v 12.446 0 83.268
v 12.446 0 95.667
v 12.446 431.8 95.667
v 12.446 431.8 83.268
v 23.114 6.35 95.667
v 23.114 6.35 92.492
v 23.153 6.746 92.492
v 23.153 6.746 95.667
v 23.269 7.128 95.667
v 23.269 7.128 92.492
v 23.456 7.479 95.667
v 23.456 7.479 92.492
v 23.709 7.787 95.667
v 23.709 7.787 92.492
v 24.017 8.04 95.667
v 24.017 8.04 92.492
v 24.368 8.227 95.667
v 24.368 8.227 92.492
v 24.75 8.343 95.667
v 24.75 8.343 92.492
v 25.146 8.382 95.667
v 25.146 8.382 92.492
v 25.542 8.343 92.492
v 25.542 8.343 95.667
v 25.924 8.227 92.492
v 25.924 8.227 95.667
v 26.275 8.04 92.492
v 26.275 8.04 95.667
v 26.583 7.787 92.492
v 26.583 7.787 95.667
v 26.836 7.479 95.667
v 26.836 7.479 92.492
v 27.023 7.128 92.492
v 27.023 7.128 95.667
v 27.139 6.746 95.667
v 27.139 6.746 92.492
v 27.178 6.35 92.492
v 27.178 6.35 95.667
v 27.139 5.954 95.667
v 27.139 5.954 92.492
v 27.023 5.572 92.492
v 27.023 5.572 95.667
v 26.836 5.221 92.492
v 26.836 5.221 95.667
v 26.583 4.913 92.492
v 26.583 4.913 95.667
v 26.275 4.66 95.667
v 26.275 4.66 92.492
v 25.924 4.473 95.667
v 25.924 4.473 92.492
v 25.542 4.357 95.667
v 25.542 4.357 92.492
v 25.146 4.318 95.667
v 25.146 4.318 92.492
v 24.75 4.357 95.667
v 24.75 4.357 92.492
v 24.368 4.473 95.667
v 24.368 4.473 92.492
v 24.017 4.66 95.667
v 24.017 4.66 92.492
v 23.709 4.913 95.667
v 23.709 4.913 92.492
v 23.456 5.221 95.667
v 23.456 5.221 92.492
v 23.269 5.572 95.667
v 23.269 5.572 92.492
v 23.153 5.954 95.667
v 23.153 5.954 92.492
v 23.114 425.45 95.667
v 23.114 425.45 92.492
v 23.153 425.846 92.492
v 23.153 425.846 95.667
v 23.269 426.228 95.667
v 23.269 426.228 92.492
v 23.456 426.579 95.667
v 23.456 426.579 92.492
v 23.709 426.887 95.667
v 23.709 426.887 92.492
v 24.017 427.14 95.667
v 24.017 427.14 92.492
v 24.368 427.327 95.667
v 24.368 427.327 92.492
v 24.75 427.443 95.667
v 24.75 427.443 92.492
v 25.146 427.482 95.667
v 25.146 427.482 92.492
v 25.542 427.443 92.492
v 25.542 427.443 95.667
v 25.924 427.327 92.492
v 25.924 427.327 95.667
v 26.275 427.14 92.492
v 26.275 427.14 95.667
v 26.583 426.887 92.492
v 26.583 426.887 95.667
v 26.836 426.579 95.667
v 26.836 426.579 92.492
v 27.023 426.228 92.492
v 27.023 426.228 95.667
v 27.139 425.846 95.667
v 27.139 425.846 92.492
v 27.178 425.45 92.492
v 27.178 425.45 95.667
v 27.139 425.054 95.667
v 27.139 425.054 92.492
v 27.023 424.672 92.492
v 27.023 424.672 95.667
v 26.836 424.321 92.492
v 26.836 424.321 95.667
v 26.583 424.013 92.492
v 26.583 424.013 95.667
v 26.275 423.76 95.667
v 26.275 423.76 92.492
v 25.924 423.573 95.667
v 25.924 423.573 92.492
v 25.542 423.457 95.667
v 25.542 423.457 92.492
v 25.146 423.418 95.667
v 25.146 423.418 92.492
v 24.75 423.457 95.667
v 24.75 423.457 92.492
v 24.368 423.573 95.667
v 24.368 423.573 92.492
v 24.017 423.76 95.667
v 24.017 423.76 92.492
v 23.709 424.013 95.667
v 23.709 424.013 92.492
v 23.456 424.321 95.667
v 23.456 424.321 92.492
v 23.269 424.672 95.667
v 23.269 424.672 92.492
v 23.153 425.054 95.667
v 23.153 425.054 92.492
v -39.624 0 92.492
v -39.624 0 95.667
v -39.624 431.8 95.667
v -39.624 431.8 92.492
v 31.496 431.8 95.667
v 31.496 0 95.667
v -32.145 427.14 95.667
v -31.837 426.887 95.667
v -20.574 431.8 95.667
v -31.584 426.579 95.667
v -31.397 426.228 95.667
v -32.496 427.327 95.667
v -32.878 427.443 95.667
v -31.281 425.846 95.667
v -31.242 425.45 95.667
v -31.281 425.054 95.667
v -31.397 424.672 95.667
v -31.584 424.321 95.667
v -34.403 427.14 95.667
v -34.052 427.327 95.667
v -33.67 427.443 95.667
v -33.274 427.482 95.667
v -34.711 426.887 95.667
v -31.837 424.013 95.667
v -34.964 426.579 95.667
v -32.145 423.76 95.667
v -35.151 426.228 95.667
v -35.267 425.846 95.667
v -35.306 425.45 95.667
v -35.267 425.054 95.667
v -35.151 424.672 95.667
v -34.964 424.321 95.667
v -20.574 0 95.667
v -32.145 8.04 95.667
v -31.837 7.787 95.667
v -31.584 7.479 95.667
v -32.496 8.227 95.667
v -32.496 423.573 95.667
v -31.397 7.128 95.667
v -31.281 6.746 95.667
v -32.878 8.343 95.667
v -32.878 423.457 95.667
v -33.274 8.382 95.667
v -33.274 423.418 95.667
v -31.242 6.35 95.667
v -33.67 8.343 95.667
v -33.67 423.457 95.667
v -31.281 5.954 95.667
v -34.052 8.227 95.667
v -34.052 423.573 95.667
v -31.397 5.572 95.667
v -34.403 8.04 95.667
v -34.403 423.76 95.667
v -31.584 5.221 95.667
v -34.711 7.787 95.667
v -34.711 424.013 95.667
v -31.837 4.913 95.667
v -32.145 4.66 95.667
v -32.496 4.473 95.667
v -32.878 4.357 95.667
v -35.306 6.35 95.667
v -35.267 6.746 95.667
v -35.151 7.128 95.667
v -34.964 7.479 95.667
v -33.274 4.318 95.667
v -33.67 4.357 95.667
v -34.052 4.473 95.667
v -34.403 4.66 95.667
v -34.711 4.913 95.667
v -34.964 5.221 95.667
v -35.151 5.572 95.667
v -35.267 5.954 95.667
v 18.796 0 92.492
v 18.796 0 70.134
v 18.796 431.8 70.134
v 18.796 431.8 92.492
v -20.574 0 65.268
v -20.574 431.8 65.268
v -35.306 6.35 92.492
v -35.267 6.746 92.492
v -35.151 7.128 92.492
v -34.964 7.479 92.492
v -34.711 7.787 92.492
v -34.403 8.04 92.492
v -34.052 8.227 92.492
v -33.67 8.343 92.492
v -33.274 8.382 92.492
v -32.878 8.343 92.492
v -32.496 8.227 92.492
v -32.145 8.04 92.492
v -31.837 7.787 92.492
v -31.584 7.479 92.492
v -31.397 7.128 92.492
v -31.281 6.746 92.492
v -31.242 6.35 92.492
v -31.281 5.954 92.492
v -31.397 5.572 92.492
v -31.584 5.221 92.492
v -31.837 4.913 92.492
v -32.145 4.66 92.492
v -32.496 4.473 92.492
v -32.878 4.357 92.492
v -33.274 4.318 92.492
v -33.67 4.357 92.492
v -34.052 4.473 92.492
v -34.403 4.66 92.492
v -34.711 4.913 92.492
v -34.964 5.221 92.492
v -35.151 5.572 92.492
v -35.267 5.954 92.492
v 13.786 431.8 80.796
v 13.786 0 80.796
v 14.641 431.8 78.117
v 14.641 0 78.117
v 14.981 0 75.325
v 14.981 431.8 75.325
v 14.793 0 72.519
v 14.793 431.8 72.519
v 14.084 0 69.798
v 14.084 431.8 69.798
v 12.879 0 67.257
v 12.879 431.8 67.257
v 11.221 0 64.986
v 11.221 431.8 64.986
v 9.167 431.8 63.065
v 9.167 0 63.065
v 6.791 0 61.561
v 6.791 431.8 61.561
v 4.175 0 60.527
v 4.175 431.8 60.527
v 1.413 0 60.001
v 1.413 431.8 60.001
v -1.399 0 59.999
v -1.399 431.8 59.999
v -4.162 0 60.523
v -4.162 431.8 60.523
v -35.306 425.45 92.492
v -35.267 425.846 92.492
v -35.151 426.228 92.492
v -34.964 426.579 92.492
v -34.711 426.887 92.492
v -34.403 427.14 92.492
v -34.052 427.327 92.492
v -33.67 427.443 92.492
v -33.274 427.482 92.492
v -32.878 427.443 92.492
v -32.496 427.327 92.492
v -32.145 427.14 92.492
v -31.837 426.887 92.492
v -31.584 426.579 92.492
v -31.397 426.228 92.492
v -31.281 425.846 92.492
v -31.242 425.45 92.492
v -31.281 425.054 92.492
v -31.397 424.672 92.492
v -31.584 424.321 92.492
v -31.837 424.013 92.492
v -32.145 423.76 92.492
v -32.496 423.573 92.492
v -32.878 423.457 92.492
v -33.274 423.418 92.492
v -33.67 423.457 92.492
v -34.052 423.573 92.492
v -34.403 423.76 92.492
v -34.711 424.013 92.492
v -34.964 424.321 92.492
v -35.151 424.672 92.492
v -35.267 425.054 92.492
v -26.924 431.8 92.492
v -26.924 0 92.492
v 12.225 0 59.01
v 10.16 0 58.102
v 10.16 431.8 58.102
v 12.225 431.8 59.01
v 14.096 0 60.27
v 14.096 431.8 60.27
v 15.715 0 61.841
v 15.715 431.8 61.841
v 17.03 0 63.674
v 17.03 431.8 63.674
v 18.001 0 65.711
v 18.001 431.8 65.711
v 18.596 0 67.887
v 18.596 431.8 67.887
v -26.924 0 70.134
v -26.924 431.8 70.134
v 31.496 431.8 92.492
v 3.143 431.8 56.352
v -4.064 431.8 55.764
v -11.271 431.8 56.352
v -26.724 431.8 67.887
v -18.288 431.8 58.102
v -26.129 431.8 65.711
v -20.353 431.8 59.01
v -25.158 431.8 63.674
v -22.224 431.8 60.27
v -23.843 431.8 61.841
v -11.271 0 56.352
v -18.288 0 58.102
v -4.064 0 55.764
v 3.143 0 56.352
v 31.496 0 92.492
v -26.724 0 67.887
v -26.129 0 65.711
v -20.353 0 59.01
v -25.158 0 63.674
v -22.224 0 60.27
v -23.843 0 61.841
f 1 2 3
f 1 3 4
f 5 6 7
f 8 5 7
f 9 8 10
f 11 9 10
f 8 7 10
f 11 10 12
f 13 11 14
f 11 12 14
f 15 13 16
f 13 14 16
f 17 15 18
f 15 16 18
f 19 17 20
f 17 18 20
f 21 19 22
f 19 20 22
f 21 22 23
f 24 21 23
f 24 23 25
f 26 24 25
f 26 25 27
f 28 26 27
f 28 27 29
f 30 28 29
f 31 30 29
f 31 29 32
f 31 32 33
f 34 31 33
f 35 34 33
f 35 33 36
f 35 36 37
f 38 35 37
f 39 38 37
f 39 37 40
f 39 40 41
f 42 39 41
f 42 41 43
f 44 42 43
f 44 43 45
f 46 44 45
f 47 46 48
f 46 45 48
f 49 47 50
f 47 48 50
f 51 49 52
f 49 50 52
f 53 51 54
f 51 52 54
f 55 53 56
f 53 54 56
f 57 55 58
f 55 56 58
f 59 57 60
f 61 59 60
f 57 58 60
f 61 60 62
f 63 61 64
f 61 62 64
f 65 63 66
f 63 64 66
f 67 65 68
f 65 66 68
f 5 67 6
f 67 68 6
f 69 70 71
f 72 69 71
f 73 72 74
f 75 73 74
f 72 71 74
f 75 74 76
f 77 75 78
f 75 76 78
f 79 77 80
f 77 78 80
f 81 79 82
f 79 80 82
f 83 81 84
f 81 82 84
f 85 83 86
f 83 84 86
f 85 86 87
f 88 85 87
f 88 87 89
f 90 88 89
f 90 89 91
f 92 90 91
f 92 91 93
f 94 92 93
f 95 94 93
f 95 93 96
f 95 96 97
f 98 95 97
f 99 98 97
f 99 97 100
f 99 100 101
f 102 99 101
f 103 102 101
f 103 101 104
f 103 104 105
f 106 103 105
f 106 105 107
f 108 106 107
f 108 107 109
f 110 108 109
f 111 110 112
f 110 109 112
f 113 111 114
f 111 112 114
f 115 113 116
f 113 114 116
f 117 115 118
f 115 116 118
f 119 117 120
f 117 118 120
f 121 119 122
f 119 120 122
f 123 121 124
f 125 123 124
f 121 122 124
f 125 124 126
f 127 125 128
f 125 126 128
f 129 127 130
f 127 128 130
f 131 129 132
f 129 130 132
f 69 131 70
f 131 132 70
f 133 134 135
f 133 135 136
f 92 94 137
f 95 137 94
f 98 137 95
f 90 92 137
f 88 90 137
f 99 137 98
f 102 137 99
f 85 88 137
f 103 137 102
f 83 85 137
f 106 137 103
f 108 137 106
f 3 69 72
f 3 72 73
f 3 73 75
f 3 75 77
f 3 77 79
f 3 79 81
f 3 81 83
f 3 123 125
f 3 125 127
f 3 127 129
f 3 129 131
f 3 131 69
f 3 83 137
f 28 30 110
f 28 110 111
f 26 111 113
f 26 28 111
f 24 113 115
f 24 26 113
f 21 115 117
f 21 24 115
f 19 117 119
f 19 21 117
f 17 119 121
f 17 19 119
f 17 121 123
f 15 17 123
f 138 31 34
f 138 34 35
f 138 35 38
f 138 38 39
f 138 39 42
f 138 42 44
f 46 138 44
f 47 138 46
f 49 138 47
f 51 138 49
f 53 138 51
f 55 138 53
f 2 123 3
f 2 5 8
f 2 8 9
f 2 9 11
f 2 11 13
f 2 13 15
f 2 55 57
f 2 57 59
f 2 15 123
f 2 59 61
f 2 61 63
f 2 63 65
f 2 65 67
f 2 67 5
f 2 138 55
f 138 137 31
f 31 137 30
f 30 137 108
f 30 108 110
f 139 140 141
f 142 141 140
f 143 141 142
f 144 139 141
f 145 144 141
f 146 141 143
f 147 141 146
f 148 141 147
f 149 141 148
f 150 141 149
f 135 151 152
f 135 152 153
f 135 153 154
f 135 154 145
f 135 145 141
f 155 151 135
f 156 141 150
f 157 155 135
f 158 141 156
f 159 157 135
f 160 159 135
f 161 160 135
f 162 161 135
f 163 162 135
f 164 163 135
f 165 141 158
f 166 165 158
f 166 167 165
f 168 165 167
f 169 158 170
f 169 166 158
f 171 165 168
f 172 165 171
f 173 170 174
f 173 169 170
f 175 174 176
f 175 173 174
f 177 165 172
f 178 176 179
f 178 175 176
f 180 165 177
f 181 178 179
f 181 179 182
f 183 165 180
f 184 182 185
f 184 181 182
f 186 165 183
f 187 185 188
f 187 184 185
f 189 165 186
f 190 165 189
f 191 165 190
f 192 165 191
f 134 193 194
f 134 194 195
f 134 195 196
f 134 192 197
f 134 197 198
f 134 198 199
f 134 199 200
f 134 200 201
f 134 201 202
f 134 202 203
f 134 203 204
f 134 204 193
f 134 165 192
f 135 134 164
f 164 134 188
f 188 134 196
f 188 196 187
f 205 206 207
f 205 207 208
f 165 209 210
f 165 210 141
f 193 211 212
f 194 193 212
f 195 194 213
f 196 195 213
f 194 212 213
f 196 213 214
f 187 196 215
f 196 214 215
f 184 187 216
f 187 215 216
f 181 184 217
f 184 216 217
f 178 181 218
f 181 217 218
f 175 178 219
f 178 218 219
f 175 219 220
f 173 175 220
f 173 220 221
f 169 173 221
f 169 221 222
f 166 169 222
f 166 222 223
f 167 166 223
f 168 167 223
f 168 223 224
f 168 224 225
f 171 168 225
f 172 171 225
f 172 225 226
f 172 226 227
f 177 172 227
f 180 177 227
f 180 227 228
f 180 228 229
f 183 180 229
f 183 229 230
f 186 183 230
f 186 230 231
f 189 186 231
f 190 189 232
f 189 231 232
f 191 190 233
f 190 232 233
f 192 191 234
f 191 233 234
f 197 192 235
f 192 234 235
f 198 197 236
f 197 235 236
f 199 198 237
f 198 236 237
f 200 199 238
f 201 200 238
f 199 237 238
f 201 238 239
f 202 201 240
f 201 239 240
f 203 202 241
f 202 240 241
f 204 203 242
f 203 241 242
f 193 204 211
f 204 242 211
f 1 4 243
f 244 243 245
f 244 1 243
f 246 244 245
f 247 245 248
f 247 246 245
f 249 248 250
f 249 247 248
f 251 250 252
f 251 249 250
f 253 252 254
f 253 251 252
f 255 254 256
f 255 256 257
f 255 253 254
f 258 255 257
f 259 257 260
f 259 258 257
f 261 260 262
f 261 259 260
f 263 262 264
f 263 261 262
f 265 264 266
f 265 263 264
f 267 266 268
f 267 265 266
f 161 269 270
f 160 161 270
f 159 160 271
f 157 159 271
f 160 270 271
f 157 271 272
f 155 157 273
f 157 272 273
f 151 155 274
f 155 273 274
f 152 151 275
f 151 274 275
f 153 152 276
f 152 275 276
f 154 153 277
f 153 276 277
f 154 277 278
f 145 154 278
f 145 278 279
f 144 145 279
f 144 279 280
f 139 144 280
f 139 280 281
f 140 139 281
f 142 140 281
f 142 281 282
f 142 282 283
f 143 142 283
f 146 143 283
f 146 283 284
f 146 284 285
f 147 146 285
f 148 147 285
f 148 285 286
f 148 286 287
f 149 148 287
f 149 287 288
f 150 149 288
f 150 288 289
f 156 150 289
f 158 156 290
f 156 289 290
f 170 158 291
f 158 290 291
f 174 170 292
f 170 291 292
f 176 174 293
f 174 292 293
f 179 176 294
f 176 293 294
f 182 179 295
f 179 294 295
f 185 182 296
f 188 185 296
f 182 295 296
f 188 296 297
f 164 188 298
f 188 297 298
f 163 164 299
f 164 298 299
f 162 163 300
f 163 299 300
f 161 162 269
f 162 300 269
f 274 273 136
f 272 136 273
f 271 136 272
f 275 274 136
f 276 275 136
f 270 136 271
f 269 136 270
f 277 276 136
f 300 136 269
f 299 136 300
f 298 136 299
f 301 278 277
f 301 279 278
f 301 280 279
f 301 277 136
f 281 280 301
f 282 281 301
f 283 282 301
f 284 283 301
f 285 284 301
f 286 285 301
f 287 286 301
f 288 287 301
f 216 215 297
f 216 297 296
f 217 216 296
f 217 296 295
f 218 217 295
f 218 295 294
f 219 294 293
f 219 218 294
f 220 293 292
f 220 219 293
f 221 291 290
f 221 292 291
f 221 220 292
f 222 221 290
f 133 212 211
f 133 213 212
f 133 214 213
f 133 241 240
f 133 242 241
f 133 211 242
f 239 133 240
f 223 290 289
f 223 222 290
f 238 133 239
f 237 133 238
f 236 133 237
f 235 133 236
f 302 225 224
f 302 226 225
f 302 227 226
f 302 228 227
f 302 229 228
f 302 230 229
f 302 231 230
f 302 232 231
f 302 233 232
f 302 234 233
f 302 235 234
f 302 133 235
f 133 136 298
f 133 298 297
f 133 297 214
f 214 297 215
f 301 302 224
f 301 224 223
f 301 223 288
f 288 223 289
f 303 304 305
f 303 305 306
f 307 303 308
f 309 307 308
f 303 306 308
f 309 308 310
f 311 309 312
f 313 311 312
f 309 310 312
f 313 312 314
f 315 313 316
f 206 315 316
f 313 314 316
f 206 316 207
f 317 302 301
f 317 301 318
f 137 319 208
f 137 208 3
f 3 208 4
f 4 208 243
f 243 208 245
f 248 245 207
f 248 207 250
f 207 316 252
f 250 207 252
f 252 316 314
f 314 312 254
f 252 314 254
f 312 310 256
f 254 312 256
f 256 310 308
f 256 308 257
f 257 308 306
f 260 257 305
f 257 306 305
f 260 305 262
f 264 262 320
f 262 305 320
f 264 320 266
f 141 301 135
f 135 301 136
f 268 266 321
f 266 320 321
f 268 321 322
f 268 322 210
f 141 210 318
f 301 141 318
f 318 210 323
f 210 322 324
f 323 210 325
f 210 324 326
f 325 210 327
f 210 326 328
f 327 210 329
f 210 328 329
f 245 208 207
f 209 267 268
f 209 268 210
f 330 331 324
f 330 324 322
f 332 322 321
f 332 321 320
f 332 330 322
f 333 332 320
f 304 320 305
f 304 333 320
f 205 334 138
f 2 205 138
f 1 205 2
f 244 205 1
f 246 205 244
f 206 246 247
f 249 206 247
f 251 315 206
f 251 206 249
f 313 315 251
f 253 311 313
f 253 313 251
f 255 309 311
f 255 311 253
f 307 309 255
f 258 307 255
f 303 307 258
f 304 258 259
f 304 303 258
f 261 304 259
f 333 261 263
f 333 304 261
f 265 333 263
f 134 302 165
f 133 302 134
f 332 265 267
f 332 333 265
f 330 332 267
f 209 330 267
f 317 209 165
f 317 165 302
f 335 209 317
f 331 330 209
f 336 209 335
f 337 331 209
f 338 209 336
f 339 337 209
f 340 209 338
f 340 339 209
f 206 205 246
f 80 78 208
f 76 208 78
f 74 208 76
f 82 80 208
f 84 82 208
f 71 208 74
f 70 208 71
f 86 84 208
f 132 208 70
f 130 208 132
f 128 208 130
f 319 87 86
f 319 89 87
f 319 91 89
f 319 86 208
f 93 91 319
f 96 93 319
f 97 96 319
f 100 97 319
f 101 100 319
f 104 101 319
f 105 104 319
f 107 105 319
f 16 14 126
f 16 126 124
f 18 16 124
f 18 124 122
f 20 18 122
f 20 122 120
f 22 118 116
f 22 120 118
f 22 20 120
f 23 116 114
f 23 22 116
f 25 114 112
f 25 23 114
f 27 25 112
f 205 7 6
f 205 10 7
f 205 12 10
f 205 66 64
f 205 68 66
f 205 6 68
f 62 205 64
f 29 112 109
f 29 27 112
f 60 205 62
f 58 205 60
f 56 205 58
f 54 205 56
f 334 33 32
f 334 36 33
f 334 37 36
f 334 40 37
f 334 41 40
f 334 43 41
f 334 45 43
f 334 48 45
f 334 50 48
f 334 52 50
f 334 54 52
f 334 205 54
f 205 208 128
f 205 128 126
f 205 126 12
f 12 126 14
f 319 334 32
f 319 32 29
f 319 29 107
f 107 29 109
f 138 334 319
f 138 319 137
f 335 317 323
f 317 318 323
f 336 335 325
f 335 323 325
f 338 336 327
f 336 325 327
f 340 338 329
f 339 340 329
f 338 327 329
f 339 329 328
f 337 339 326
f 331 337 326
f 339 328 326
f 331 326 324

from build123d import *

# Parameters (mm, degrees)
BOSS_EXTRUDE1_DEPTH = 431.8
FILLET2_R           = 12.7
SKETCH2_R           = 2.032
CUT_EXTRUDE1_DEPTH  = 436.166892099


with BuildPart() as part:
    # Sketch1 → Boss-Extrude1 (new body)
    with BuildSketch(Plane(origin=(0, 0, 0), x_dir=(1, 0, 0), z_dir=(0, 1, 0))):
        with BuildLine():
            Line((12.446, -95.666893232), (12.446, -83.267976842))
            ThreePointArc((12.446, -83.267976842), (12.103082443, -66.082532596), (-4.162019583, -60.523437125))
            Line((-4.162019583, -60.523437125), (-20.574, -65.268050741))
            Line((-20.574, -65.268050741), (-20.574, -84.572180345))
            Line((-20.574, -84.572180345), (-20.574, -95.666893232))
            Line((-20.574, -95.666893232), (-39.624, -95.666893232))
            Line((-39.624, -95.666893232), (-39.624, -92.491893232))
            Line((-39.624, -92.491893232), (-26.924, -92.491893232))
            Line((-26.924, -92.491893232), (-26.924, -62.093050741))
            ThreePointArc((-26.924, -62.093050741), (-4.064, -55.764211531), (18.796, -62.093050741))
            Line((18.796, -62.093050741), (18.796, -92.491893232))
            Line((18.796, -92.491893232), (31.496, -92.491893232))
            Line((31.496, -92.491893232), (31.496, -95.666893232))
            Line((31.496, -95.666893232), (12.446, -95.666893232))
        make_face()
    extrude(amount=BOSS_EXTRUDE1_DEPTH)

    # Fillet2
    fillet2_edges = [part.edges().sort_by_distance(p)[0] for p in [
        (-26.924, 215.9, 62.093050741),
        (18.796, 215.9, 62.093050741),
    ]]
    fillet(fillet2_edges, radius=FILLET2_R)

    # Sketch2 → Cut-Extrude1 (cut, through all)
    with BuildSketch(Plane(origin=(0, 0, 92.491893232), x_dir=(-1, 0, 0), z_dir=(0, 0, -1))):
        with Locations((-25.146, 425.45)):
            Circle(SKETCH2_R)
        with Locations((-25.146, 6.35)):
            Circle(SKETCH2_R)
        with Locations((33.274, 425.45)):
            Circle(SKETCH2_R)
        with Locations((33.274, 6.35)):
            Circle(SKETCH2_R)
    extrude(amount=-CUT_EXTRUDE1_DEPTH, mode=Mode.SUBTRACT)


solid = part.part
